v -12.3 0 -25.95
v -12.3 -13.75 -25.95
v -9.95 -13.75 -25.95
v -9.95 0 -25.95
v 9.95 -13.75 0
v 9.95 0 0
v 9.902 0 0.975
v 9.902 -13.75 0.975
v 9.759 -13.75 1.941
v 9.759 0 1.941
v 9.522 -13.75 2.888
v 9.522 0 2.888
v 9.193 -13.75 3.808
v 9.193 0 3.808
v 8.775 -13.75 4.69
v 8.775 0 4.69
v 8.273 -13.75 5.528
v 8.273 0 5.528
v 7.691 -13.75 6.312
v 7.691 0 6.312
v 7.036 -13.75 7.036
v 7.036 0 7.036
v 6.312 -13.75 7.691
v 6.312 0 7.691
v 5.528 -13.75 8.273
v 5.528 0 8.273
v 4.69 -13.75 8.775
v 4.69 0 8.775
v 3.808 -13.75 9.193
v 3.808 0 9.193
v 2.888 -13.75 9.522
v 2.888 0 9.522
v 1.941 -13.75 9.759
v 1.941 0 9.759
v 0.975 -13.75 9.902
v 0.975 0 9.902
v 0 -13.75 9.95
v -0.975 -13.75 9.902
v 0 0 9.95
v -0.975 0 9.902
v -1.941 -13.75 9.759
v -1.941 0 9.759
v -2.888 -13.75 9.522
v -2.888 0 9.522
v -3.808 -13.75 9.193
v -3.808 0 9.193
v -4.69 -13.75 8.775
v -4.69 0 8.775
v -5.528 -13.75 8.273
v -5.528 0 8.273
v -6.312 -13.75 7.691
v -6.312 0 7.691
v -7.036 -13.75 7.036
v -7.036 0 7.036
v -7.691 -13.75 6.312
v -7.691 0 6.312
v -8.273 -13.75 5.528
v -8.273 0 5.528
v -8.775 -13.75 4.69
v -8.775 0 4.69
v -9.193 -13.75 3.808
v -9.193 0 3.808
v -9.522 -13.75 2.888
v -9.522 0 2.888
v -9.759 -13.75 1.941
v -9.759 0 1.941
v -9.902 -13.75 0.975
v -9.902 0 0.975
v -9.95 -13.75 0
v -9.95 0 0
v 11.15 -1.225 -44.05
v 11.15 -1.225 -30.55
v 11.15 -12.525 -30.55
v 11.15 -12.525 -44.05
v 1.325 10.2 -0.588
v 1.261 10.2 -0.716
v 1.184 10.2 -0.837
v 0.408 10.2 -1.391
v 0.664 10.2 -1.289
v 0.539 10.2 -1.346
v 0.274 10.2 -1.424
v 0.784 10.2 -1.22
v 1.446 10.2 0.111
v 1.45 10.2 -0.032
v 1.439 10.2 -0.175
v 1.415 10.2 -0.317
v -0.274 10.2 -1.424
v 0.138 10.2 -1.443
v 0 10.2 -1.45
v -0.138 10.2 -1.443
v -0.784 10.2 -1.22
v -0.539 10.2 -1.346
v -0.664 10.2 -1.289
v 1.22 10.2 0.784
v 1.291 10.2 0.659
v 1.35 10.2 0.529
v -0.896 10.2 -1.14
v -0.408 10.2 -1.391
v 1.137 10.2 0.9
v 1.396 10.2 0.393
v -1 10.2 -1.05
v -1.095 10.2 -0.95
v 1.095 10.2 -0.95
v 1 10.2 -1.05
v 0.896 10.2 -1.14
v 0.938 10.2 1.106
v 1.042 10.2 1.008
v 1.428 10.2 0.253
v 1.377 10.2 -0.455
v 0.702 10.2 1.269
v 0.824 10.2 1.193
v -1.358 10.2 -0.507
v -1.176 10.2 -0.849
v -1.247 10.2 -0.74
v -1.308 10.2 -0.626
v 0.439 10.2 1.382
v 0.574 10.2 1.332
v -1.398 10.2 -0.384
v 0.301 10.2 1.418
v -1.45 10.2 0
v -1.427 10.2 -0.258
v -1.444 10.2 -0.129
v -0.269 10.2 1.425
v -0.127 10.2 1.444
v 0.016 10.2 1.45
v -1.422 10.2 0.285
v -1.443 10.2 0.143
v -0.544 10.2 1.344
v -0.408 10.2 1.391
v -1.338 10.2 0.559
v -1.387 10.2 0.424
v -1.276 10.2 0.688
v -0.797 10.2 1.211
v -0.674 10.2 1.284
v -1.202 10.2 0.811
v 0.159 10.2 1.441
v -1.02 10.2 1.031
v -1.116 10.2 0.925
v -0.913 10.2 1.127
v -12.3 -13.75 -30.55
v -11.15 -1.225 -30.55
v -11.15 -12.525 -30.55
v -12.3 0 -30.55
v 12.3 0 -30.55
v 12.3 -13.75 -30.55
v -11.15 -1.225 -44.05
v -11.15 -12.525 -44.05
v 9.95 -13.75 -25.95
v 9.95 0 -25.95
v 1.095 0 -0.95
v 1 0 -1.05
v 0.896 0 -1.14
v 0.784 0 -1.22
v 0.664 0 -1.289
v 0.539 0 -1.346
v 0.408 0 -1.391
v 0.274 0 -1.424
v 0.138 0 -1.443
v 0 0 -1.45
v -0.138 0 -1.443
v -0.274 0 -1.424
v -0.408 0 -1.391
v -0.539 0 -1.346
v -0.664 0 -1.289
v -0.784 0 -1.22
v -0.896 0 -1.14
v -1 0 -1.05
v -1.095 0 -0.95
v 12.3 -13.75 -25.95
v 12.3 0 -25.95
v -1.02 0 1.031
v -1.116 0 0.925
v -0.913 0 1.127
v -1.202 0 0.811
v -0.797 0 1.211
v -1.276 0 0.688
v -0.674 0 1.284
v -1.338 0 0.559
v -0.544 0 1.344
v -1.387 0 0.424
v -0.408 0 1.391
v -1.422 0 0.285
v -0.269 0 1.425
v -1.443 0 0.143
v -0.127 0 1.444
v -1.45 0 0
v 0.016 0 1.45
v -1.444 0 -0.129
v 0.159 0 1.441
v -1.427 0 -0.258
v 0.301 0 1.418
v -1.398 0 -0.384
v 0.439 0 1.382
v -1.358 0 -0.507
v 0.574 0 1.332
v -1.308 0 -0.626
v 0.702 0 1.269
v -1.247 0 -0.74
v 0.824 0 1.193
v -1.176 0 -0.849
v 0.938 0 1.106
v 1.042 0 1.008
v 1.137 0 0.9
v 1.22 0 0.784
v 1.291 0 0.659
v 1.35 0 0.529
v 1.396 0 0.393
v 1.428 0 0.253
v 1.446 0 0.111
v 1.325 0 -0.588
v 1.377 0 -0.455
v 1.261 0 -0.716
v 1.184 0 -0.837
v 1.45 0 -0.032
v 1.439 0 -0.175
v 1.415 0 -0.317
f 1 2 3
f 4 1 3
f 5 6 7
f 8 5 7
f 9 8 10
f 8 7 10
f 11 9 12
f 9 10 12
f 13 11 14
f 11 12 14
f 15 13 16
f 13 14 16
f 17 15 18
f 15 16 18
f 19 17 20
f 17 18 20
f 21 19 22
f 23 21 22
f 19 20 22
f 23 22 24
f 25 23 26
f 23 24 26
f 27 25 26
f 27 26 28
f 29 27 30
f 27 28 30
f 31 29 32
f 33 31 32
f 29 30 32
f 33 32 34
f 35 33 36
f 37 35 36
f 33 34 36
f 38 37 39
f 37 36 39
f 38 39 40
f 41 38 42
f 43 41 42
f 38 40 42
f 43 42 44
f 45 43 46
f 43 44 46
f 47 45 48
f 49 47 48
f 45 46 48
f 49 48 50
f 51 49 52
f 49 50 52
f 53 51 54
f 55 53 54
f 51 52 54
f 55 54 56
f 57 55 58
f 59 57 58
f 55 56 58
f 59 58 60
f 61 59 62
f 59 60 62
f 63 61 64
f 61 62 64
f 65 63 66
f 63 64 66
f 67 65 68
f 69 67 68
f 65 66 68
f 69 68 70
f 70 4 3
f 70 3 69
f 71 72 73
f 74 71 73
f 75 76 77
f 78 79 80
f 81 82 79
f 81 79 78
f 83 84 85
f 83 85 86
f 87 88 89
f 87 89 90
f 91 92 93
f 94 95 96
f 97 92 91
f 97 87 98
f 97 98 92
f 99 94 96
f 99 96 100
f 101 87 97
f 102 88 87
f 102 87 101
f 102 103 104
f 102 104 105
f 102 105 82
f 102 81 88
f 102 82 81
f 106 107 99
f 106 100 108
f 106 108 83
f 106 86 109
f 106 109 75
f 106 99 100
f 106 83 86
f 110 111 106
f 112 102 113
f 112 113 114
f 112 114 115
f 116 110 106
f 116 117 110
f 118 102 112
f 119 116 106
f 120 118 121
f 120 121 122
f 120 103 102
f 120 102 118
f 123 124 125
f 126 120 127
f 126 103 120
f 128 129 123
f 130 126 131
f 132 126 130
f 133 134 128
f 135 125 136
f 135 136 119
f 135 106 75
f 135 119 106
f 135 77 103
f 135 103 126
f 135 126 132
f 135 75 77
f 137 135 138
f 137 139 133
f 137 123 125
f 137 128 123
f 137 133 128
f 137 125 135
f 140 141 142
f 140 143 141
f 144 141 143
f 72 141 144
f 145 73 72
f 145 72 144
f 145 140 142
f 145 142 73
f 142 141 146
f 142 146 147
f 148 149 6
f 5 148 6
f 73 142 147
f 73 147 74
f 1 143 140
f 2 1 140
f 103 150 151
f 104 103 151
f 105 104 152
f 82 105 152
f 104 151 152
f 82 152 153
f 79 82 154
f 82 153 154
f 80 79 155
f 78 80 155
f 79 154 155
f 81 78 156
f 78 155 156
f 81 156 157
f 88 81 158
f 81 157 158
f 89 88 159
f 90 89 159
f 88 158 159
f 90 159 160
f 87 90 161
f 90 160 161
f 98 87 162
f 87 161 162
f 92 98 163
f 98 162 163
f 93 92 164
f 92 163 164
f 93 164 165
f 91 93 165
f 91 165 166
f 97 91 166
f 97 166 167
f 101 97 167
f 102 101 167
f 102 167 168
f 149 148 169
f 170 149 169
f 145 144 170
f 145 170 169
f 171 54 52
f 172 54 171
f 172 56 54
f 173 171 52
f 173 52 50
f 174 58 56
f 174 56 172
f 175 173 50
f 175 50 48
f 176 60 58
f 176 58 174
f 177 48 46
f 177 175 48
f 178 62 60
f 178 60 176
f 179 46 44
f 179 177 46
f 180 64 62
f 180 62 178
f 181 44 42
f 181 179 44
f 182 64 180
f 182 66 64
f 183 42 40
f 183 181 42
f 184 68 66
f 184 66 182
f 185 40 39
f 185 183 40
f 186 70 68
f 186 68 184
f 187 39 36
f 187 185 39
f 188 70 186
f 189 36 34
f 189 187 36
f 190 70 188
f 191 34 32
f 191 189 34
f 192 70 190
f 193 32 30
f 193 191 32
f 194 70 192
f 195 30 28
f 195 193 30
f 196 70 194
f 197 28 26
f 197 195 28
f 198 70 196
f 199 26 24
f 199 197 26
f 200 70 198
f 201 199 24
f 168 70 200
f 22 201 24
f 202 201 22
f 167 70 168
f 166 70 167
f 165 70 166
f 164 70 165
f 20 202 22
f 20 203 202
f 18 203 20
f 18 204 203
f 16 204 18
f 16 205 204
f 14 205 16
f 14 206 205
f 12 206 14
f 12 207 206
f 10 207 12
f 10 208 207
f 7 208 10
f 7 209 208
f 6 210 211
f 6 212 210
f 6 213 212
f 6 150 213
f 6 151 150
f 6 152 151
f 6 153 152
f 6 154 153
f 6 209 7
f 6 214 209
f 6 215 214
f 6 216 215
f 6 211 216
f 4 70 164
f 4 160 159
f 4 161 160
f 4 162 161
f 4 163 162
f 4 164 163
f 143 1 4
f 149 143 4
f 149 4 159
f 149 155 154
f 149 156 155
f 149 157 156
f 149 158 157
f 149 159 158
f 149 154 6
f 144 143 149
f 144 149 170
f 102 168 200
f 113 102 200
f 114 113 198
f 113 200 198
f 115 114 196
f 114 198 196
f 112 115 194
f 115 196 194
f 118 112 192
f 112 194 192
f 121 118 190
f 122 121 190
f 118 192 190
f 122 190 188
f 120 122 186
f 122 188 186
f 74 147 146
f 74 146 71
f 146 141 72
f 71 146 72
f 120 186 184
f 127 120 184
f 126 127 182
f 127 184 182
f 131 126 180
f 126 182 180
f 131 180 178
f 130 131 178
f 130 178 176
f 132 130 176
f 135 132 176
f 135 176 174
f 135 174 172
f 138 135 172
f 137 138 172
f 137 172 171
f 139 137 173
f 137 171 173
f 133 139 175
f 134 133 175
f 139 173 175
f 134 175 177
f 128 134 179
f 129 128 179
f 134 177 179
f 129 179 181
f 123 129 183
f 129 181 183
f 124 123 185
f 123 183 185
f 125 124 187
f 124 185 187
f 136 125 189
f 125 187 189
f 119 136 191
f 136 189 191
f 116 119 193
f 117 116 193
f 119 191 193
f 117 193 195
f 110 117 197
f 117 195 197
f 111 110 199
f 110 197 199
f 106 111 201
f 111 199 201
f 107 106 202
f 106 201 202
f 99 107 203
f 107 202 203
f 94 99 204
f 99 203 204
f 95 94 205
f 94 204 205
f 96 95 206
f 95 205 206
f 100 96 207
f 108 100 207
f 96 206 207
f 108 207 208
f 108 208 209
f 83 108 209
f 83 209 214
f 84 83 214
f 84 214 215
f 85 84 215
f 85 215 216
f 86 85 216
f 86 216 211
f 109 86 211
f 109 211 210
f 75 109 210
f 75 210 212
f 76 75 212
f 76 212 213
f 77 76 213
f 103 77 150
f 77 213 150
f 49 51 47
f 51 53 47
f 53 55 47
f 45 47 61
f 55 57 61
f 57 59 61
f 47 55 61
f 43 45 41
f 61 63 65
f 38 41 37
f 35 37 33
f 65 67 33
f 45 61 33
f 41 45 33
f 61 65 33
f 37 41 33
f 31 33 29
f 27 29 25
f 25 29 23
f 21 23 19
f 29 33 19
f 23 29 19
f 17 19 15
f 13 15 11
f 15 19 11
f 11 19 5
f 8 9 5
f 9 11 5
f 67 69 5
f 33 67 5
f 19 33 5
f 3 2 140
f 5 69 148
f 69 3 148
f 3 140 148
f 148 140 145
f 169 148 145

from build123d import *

# Parameters (mm, degrees)
F0_W     = 19.9
F0_H     = 30.55
F1_DEPTH = 13.75
F3_DEPTH = 10.2
F5_W     = 24.6
F5_H     = 13.75
F6_DEPTH = 4.6
F7_W     = 22.3
F7_H     = 11.3
F8_DEPTH = 13.5


with BuildPart() as f1:
    # F0 (on Front) → F1 (new body)
    with BuildSketch(Plane.XZ):
        with BuildLine():
            ThreePointArc((9.95, 0), (0, 9.95), (-9.95, 0))
            Line((-9.95, 0), (9.95, 0))
        make_face()
        with Locations((0, -15.275)):
            Rectangle(F0_W, F0_H)
    extrude(amount=F1_DEPTH)

    # F2 (on face) → F3 (join)
    with BuildSketch(Plane(origin=(0, 0, 0), x_dir=(-1, 0, 0), z_dir=(0, 1, 0))):
        with BuildLine():
            ThreePointArc((1.095445115, -0.95), (1.3584725645, -0.5070032462), (1.45, 0))
            ThreePointArc((1.45, 0), (-0.5070032462, 1.3584725645), (-1.095445115, -0.95))
            Line((-1.095445115, -0.95), (1.095445115, -0.95))
        make_face()
        with BuildLine():
            Line((1.095445115, -0.95), (-1.095445115, -0.95))
            ThreePointArc((-1.095445115, -0.95), (0, -1.45), (1.095445115, -0.95))
        make_face()
    extrude(amount=F3_DEPTH)

    # F5 (on offset) → F6 (join)
    with BuildSketch(Plane(origin=(0, 0, -30.55), x_dir=(1, 0, 0), z_dir=(0, 0, -1))):
        with Locations((0, 6.875)):
            Rectangle(F5_W, F5_H)
    extrude(amount=-F6_DEPTH)

    # F7 (on offset) → F8 (join)
    with BuildSketch(Plane(origin=(0, 0, -30.55), x_dir=(1, 0, 0), z_dir=(0, 0, -1))):
        with Locations((0, 6.875)):
            Rectangle(F7_W, F7_H)
    extrude(amount=F8_DEPTH)


solid = f1.part
